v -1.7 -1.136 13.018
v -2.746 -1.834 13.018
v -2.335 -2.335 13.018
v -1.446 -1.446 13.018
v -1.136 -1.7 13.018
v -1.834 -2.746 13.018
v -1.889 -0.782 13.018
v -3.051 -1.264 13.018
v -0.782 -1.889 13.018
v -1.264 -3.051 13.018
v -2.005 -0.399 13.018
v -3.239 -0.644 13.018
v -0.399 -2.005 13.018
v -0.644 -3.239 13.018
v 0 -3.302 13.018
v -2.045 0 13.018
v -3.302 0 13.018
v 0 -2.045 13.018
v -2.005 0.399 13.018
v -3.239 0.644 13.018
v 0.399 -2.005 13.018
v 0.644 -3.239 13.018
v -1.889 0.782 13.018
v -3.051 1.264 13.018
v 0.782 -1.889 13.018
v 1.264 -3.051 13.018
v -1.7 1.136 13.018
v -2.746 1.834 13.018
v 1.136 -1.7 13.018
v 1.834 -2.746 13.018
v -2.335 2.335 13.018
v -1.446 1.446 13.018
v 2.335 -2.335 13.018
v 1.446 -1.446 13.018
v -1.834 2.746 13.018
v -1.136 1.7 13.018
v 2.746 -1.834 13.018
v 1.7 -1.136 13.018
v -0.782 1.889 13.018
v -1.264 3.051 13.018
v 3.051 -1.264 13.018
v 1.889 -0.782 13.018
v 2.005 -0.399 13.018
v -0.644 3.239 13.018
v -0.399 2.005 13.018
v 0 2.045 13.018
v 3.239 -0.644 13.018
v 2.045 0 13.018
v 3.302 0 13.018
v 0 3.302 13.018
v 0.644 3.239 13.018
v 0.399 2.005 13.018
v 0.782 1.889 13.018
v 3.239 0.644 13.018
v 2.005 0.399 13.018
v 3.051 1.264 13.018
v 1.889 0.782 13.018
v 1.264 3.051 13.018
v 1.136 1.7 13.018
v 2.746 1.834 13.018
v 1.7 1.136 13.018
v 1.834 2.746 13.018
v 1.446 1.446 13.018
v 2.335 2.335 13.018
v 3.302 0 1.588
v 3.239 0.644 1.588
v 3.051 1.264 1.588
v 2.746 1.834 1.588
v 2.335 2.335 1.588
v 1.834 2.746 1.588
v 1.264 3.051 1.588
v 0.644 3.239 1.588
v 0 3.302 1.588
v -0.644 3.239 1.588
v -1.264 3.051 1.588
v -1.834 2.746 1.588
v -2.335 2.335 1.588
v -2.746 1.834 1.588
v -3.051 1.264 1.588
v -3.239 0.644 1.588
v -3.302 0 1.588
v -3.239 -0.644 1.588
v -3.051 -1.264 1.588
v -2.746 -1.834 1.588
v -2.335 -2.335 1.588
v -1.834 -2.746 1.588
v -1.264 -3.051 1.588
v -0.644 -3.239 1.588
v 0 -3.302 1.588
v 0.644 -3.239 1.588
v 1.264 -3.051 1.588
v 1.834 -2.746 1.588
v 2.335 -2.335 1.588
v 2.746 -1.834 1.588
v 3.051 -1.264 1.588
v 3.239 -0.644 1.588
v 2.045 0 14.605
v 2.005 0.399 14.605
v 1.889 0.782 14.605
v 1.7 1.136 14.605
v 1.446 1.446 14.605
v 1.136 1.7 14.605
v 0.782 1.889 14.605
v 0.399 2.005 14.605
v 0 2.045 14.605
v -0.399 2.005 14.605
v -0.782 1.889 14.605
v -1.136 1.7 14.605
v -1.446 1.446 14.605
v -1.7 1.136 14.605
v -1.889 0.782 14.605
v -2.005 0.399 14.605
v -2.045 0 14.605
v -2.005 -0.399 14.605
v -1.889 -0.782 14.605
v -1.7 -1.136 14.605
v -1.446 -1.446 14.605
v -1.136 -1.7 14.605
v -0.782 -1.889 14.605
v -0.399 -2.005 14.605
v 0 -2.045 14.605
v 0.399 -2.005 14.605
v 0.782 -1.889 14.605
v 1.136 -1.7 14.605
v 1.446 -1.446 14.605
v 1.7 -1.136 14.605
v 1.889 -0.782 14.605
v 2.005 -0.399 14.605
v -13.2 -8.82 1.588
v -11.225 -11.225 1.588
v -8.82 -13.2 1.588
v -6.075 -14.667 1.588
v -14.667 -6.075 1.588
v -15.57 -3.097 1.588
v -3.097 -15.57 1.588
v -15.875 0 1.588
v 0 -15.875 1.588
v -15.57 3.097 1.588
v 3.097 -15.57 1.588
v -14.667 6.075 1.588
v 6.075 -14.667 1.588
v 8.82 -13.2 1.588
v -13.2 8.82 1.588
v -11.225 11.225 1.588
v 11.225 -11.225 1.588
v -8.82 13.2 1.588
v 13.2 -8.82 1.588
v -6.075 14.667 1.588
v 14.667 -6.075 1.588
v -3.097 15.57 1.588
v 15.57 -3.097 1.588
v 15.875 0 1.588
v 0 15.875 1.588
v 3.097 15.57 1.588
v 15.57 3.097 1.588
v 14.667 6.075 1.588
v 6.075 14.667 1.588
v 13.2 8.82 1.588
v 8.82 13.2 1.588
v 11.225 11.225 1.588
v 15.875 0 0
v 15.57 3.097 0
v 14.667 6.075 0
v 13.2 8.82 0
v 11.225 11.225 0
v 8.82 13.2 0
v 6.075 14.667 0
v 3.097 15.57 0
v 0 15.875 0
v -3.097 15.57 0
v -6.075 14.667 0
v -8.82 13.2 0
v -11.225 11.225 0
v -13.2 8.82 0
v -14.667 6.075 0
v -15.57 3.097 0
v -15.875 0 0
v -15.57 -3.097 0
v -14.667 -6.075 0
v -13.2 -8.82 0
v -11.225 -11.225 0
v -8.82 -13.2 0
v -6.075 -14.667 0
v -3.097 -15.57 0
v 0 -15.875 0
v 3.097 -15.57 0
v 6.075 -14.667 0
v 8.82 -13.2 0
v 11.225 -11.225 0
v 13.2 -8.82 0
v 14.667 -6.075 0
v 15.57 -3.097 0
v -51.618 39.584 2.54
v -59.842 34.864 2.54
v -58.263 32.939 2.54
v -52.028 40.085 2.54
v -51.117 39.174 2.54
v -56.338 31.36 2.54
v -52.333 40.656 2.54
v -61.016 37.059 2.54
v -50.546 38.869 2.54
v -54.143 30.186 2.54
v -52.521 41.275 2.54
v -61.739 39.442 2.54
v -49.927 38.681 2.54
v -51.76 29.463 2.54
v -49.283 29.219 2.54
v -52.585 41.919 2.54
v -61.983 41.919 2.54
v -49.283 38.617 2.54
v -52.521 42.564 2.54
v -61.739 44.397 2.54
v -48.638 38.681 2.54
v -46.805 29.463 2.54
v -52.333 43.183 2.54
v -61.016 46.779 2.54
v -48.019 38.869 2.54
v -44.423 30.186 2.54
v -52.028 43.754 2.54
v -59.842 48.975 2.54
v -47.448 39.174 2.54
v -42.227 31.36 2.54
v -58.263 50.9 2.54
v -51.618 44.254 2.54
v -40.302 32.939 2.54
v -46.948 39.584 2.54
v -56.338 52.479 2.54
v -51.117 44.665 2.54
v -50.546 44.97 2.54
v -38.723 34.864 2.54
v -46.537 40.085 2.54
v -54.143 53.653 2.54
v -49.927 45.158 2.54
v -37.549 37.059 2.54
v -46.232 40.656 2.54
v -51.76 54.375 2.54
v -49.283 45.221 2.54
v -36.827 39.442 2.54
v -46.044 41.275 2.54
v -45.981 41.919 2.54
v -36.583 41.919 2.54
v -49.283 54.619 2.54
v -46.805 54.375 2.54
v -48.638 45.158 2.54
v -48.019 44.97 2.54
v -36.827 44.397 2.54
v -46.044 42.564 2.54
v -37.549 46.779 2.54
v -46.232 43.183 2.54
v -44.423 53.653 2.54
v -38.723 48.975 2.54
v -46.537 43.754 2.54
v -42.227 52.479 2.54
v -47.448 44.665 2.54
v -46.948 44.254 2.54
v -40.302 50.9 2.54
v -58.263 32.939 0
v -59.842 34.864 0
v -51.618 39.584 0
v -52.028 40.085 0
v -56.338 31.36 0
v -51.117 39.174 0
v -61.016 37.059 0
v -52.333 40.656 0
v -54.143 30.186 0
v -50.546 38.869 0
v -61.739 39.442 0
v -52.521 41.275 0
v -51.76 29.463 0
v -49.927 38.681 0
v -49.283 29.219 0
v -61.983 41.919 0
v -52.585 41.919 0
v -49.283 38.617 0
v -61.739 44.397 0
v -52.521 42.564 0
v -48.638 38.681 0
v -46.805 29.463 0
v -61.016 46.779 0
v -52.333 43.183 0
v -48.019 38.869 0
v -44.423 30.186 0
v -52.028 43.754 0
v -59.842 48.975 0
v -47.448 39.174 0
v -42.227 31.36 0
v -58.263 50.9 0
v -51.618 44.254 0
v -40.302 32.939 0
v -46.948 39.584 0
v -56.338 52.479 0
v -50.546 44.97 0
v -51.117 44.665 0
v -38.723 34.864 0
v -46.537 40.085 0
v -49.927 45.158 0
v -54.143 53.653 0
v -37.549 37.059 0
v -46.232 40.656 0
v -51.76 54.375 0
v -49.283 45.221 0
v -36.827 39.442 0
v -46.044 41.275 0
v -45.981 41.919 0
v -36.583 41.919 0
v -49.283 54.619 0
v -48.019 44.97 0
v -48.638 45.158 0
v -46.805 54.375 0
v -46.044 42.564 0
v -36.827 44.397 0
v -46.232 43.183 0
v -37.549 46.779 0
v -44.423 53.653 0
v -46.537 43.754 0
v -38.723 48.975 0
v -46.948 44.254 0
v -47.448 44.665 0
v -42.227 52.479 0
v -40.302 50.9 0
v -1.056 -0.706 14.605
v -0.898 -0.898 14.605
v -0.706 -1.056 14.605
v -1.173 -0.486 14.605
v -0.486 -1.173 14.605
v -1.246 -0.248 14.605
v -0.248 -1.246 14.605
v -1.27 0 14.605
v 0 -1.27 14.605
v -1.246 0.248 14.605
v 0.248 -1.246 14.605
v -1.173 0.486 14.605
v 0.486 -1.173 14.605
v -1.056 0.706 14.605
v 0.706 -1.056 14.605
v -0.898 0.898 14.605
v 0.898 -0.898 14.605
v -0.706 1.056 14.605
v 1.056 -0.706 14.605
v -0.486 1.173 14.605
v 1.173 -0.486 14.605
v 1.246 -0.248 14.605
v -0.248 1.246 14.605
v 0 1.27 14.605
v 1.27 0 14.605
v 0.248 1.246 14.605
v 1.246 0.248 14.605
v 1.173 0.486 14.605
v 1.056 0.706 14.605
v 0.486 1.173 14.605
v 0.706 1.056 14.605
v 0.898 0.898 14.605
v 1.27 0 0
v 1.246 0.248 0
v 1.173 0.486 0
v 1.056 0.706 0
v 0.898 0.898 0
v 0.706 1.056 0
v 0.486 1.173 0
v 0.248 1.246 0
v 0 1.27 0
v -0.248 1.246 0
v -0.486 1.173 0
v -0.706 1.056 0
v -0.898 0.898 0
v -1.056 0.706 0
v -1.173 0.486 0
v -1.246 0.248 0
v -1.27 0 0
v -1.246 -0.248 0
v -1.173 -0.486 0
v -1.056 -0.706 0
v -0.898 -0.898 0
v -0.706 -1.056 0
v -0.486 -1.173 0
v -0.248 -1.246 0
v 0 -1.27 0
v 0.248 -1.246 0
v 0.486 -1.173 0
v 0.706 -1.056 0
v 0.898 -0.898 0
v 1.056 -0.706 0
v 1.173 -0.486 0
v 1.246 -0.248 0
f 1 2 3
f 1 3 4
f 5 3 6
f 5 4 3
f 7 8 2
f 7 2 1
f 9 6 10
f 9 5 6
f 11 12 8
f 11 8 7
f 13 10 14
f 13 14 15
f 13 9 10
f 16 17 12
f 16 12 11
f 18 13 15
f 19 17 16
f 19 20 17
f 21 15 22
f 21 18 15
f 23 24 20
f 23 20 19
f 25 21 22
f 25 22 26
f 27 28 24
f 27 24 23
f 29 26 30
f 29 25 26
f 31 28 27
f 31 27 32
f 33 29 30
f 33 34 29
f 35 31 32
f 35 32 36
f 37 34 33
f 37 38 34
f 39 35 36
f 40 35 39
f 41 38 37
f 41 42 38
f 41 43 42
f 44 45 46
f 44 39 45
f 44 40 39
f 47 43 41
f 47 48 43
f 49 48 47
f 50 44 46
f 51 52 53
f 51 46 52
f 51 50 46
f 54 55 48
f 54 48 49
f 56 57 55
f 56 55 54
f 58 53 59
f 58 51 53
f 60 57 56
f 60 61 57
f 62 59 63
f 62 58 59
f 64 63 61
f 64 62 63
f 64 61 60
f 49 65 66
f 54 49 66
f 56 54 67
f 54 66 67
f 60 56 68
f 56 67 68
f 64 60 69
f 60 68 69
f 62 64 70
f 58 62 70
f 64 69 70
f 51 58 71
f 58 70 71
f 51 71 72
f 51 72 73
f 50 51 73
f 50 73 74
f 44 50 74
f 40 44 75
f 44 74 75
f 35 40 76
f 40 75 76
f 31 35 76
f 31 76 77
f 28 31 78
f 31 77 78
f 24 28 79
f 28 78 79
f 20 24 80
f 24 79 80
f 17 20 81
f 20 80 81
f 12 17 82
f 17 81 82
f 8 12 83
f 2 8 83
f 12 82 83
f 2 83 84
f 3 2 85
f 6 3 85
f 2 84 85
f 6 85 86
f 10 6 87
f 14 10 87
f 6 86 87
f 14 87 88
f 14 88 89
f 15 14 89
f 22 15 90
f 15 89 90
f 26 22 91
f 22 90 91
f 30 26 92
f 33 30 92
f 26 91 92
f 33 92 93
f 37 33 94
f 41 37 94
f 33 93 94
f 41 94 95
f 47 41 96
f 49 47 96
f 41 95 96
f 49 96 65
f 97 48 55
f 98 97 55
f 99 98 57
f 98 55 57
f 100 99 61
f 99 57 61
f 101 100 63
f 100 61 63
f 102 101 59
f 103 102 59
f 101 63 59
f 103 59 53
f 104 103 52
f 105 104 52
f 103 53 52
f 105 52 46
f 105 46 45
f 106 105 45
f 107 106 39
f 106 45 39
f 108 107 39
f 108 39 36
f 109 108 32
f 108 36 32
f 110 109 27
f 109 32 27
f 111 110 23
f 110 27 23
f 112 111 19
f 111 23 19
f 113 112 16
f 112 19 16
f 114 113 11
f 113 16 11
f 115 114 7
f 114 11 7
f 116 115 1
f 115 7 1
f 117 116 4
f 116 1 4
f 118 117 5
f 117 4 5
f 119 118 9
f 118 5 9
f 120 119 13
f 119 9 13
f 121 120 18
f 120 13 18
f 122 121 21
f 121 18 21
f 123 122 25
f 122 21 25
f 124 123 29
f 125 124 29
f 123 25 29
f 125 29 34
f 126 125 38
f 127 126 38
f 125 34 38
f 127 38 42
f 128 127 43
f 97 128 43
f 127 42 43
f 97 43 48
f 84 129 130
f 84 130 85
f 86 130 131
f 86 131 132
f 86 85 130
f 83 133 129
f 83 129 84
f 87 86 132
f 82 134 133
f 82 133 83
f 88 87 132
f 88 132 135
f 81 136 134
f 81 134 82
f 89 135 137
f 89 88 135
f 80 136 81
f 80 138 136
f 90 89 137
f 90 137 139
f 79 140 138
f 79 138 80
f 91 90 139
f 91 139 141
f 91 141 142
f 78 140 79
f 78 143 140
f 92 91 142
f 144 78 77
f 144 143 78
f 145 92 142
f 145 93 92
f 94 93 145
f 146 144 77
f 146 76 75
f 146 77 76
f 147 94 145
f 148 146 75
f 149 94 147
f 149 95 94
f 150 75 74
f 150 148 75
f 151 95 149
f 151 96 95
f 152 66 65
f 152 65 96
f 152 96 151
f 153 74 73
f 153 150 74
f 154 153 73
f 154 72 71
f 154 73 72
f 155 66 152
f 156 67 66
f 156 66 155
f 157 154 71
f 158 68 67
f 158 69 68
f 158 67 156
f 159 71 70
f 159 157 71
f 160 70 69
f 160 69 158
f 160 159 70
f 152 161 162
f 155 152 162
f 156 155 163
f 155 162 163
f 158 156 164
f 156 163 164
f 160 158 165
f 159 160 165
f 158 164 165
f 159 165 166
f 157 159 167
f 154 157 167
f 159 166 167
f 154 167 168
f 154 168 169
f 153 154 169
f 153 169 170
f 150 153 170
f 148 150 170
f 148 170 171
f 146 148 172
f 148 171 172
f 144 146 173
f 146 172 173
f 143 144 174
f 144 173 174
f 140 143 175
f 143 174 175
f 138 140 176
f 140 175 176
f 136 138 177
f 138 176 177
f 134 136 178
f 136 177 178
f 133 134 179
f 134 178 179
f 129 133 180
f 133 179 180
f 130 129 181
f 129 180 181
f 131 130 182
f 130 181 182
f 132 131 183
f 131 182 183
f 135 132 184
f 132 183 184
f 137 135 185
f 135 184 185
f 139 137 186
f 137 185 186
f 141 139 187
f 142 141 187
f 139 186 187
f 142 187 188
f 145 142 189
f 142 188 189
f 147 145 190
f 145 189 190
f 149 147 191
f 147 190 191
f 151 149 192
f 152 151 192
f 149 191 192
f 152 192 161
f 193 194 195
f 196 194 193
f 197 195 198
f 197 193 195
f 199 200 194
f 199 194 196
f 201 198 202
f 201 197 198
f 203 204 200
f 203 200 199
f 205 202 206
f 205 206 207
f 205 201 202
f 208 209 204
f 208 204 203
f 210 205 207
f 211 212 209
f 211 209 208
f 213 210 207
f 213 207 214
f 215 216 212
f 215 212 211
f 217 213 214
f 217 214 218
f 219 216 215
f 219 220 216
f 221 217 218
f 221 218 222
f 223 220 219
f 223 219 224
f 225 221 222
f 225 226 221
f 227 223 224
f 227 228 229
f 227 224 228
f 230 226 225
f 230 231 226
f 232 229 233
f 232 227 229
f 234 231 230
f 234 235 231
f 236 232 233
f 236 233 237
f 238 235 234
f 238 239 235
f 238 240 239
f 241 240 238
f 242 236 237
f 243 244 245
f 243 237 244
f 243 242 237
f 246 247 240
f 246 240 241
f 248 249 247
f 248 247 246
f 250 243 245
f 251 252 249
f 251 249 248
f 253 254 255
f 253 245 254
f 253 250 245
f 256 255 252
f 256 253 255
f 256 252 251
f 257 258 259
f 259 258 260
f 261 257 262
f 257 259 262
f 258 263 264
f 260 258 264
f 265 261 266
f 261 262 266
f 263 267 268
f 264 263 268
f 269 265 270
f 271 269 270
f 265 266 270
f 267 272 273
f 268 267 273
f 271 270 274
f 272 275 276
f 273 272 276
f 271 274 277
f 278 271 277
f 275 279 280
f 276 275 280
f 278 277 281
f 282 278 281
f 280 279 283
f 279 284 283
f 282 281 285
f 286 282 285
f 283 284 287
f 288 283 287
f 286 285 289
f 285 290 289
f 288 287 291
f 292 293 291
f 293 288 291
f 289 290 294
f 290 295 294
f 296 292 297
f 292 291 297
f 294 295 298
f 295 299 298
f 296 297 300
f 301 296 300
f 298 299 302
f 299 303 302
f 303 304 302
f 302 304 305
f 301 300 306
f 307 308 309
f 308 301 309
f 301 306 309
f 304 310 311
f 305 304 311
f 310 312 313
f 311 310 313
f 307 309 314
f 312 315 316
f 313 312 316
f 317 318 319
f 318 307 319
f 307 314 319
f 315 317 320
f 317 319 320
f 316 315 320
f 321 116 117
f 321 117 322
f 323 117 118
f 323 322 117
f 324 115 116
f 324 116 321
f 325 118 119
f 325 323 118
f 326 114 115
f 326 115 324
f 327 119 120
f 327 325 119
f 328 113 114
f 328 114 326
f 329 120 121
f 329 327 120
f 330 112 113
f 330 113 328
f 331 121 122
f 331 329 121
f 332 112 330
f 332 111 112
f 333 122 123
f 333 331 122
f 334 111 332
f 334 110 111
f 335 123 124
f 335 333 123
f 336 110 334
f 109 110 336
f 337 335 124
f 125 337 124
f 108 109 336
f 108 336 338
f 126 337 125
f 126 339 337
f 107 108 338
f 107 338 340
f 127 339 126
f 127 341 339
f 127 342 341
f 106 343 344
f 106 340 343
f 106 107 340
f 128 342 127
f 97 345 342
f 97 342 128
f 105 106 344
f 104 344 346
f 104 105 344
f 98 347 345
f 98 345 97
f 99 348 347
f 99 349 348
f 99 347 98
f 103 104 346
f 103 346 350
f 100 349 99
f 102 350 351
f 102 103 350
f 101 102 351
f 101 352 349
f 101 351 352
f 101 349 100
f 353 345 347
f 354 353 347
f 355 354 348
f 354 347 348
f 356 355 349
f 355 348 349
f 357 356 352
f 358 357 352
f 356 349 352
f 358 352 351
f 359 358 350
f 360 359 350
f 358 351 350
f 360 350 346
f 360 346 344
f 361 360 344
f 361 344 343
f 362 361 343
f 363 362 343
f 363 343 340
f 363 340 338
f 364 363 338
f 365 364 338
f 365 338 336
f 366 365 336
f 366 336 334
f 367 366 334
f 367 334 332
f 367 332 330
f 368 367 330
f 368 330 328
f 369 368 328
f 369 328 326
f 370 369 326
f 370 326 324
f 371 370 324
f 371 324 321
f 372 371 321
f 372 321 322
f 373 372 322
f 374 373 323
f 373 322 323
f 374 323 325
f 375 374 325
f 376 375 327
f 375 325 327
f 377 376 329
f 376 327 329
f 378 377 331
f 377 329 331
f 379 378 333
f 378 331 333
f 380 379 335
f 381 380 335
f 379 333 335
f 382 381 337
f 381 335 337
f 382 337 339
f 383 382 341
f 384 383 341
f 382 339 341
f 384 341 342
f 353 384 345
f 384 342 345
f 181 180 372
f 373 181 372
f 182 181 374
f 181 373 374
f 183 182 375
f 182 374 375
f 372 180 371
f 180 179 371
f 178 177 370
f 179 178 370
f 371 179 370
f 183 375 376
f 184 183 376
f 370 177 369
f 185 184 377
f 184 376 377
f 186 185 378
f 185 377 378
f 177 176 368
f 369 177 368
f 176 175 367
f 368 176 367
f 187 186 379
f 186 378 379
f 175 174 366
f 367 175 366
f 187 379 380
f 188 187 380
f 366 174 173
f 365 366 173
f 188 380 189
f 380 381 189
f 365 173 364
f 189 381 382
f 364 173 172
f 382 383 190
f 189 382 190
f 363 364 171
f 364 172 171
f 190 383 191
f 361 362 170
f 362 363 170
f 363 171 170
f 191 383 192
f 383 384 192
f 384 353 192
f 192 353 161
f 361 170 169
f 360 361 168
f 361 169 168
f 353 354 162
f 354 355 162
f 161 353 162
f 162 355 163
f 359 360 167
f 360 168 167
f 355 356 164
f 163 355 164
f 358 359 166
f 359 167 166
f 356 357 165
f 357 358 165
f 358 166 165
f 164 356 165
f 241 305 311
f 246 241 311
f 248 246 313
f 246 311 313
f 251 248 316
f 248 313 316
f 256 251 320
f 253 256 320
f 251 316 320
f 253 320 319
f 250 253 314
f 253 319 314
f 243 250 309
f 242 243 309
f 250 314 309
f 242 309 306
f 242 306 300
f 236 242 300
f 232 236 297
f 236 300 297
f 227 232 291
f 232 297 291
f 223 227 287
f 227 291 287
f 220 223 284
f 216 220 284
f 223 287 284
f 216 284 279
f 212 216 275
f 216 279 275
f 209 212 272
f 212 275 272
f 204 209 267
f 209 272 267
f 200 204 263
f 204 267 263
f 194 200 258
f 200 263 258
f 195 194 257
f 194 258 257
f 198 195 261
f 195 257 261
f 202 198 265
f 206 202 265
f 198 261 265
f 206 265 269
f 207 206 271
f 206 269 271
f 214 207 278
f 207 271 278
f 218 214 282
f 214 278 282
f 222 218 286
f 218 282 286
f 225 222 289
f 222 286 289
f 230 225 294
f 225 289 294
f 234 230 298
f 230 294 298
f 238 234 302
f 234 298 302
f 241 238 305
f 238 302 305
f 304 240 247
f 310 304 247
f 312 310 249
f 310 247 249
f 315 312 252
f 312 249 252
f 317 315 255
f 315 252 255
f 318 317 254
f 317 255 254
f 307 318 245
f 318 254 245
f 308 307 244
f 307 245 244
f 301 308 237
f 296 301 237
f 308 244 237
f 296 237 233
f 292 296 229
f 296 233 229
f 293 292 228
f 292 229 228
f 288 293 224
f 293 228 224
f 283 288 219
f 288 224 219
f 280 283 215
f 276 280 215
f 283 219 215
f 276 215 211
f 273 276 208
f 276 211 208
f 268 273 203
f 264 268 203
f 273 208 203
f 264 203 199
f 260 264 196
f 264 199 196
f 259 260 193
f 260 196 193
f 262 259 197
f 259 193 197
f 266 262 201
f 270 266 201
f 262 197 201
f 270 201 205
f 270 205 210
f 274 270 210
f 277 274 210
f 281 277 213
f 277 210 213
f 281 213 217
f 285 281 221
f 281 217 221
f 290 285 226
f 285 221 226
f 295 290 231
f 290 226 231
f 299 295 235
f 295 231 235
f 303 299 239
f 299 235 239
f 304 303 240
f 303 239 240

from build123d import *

# Parameters (mm, degrees)
F0_R      = 15.875
F2_DEPTH  = 1.5875
F3_R      = 3.302
F4_DEPTH  = 11.43
F5_R      = 2.0447
F6_DEPTH  = 1.5875
F7_R      = 1.27
F8_DEPTH  = 19.05
F9_R      = 2.667
F10_DEPTH = 6.35
F11_R     = 12.7
F12_DEPTH = 2.54
F13_R     = 3.302
F14_DEPTH = 2.54


with BuildPart() as f2:
    # F0 (on Top) → F2 (new body)
    with BuildSketch(Plane.XY):
        Circle(F0_R)
    extrude(amount=F2_DEPTH)

    # F3 (on face) → F4 (join)
    with BuildSketch(Plane.XY.offset(1.5875)):
        Circle(F3_R)
    extrude(amount=F4_DEPTH)

    # F5 (on face) → F6 (join)
    with BuildSketch(Plane.XY.offset(13.0175)):
        Circle(F5_R)
    extrude(amount=F6_DEPTH)

    # F7 (on face) → F8 (cut)
    with BuildSketch(Plane.XY.offset(14.605)):
        Circle(F7_R)
    extrude(amount=-F8_DEPTH, mode=Mode.SUBTRACT)

    # F9 (on face) → F10 (cut)
    with BuildSketch(Plane.XY):
        Circle(F9_R)
    extrude(amount=-F10_DEPTH, mode=Mode.SUBTRACT)


with BuildPart() as f12:
    # F11 (on Top) → F12 (new body)
    with BuildSketch(Plane.XY):
        with Locations((-49.282685, 41.919351)):
            Circle(F11_R)
    extrude(amount=F12_DEPTH)

    # F13 (on face) → F14 (cut)
    with BuildSketch(Plane.XY.offset(2.54)):
        with Locations((-49.282685, 41.919351)):
            Circle(F13_R)
    extrude(amount=-F14_DEPTH, mode=Mode.SUBTRACT)


solid = Compound([f2.part, f12.part])
